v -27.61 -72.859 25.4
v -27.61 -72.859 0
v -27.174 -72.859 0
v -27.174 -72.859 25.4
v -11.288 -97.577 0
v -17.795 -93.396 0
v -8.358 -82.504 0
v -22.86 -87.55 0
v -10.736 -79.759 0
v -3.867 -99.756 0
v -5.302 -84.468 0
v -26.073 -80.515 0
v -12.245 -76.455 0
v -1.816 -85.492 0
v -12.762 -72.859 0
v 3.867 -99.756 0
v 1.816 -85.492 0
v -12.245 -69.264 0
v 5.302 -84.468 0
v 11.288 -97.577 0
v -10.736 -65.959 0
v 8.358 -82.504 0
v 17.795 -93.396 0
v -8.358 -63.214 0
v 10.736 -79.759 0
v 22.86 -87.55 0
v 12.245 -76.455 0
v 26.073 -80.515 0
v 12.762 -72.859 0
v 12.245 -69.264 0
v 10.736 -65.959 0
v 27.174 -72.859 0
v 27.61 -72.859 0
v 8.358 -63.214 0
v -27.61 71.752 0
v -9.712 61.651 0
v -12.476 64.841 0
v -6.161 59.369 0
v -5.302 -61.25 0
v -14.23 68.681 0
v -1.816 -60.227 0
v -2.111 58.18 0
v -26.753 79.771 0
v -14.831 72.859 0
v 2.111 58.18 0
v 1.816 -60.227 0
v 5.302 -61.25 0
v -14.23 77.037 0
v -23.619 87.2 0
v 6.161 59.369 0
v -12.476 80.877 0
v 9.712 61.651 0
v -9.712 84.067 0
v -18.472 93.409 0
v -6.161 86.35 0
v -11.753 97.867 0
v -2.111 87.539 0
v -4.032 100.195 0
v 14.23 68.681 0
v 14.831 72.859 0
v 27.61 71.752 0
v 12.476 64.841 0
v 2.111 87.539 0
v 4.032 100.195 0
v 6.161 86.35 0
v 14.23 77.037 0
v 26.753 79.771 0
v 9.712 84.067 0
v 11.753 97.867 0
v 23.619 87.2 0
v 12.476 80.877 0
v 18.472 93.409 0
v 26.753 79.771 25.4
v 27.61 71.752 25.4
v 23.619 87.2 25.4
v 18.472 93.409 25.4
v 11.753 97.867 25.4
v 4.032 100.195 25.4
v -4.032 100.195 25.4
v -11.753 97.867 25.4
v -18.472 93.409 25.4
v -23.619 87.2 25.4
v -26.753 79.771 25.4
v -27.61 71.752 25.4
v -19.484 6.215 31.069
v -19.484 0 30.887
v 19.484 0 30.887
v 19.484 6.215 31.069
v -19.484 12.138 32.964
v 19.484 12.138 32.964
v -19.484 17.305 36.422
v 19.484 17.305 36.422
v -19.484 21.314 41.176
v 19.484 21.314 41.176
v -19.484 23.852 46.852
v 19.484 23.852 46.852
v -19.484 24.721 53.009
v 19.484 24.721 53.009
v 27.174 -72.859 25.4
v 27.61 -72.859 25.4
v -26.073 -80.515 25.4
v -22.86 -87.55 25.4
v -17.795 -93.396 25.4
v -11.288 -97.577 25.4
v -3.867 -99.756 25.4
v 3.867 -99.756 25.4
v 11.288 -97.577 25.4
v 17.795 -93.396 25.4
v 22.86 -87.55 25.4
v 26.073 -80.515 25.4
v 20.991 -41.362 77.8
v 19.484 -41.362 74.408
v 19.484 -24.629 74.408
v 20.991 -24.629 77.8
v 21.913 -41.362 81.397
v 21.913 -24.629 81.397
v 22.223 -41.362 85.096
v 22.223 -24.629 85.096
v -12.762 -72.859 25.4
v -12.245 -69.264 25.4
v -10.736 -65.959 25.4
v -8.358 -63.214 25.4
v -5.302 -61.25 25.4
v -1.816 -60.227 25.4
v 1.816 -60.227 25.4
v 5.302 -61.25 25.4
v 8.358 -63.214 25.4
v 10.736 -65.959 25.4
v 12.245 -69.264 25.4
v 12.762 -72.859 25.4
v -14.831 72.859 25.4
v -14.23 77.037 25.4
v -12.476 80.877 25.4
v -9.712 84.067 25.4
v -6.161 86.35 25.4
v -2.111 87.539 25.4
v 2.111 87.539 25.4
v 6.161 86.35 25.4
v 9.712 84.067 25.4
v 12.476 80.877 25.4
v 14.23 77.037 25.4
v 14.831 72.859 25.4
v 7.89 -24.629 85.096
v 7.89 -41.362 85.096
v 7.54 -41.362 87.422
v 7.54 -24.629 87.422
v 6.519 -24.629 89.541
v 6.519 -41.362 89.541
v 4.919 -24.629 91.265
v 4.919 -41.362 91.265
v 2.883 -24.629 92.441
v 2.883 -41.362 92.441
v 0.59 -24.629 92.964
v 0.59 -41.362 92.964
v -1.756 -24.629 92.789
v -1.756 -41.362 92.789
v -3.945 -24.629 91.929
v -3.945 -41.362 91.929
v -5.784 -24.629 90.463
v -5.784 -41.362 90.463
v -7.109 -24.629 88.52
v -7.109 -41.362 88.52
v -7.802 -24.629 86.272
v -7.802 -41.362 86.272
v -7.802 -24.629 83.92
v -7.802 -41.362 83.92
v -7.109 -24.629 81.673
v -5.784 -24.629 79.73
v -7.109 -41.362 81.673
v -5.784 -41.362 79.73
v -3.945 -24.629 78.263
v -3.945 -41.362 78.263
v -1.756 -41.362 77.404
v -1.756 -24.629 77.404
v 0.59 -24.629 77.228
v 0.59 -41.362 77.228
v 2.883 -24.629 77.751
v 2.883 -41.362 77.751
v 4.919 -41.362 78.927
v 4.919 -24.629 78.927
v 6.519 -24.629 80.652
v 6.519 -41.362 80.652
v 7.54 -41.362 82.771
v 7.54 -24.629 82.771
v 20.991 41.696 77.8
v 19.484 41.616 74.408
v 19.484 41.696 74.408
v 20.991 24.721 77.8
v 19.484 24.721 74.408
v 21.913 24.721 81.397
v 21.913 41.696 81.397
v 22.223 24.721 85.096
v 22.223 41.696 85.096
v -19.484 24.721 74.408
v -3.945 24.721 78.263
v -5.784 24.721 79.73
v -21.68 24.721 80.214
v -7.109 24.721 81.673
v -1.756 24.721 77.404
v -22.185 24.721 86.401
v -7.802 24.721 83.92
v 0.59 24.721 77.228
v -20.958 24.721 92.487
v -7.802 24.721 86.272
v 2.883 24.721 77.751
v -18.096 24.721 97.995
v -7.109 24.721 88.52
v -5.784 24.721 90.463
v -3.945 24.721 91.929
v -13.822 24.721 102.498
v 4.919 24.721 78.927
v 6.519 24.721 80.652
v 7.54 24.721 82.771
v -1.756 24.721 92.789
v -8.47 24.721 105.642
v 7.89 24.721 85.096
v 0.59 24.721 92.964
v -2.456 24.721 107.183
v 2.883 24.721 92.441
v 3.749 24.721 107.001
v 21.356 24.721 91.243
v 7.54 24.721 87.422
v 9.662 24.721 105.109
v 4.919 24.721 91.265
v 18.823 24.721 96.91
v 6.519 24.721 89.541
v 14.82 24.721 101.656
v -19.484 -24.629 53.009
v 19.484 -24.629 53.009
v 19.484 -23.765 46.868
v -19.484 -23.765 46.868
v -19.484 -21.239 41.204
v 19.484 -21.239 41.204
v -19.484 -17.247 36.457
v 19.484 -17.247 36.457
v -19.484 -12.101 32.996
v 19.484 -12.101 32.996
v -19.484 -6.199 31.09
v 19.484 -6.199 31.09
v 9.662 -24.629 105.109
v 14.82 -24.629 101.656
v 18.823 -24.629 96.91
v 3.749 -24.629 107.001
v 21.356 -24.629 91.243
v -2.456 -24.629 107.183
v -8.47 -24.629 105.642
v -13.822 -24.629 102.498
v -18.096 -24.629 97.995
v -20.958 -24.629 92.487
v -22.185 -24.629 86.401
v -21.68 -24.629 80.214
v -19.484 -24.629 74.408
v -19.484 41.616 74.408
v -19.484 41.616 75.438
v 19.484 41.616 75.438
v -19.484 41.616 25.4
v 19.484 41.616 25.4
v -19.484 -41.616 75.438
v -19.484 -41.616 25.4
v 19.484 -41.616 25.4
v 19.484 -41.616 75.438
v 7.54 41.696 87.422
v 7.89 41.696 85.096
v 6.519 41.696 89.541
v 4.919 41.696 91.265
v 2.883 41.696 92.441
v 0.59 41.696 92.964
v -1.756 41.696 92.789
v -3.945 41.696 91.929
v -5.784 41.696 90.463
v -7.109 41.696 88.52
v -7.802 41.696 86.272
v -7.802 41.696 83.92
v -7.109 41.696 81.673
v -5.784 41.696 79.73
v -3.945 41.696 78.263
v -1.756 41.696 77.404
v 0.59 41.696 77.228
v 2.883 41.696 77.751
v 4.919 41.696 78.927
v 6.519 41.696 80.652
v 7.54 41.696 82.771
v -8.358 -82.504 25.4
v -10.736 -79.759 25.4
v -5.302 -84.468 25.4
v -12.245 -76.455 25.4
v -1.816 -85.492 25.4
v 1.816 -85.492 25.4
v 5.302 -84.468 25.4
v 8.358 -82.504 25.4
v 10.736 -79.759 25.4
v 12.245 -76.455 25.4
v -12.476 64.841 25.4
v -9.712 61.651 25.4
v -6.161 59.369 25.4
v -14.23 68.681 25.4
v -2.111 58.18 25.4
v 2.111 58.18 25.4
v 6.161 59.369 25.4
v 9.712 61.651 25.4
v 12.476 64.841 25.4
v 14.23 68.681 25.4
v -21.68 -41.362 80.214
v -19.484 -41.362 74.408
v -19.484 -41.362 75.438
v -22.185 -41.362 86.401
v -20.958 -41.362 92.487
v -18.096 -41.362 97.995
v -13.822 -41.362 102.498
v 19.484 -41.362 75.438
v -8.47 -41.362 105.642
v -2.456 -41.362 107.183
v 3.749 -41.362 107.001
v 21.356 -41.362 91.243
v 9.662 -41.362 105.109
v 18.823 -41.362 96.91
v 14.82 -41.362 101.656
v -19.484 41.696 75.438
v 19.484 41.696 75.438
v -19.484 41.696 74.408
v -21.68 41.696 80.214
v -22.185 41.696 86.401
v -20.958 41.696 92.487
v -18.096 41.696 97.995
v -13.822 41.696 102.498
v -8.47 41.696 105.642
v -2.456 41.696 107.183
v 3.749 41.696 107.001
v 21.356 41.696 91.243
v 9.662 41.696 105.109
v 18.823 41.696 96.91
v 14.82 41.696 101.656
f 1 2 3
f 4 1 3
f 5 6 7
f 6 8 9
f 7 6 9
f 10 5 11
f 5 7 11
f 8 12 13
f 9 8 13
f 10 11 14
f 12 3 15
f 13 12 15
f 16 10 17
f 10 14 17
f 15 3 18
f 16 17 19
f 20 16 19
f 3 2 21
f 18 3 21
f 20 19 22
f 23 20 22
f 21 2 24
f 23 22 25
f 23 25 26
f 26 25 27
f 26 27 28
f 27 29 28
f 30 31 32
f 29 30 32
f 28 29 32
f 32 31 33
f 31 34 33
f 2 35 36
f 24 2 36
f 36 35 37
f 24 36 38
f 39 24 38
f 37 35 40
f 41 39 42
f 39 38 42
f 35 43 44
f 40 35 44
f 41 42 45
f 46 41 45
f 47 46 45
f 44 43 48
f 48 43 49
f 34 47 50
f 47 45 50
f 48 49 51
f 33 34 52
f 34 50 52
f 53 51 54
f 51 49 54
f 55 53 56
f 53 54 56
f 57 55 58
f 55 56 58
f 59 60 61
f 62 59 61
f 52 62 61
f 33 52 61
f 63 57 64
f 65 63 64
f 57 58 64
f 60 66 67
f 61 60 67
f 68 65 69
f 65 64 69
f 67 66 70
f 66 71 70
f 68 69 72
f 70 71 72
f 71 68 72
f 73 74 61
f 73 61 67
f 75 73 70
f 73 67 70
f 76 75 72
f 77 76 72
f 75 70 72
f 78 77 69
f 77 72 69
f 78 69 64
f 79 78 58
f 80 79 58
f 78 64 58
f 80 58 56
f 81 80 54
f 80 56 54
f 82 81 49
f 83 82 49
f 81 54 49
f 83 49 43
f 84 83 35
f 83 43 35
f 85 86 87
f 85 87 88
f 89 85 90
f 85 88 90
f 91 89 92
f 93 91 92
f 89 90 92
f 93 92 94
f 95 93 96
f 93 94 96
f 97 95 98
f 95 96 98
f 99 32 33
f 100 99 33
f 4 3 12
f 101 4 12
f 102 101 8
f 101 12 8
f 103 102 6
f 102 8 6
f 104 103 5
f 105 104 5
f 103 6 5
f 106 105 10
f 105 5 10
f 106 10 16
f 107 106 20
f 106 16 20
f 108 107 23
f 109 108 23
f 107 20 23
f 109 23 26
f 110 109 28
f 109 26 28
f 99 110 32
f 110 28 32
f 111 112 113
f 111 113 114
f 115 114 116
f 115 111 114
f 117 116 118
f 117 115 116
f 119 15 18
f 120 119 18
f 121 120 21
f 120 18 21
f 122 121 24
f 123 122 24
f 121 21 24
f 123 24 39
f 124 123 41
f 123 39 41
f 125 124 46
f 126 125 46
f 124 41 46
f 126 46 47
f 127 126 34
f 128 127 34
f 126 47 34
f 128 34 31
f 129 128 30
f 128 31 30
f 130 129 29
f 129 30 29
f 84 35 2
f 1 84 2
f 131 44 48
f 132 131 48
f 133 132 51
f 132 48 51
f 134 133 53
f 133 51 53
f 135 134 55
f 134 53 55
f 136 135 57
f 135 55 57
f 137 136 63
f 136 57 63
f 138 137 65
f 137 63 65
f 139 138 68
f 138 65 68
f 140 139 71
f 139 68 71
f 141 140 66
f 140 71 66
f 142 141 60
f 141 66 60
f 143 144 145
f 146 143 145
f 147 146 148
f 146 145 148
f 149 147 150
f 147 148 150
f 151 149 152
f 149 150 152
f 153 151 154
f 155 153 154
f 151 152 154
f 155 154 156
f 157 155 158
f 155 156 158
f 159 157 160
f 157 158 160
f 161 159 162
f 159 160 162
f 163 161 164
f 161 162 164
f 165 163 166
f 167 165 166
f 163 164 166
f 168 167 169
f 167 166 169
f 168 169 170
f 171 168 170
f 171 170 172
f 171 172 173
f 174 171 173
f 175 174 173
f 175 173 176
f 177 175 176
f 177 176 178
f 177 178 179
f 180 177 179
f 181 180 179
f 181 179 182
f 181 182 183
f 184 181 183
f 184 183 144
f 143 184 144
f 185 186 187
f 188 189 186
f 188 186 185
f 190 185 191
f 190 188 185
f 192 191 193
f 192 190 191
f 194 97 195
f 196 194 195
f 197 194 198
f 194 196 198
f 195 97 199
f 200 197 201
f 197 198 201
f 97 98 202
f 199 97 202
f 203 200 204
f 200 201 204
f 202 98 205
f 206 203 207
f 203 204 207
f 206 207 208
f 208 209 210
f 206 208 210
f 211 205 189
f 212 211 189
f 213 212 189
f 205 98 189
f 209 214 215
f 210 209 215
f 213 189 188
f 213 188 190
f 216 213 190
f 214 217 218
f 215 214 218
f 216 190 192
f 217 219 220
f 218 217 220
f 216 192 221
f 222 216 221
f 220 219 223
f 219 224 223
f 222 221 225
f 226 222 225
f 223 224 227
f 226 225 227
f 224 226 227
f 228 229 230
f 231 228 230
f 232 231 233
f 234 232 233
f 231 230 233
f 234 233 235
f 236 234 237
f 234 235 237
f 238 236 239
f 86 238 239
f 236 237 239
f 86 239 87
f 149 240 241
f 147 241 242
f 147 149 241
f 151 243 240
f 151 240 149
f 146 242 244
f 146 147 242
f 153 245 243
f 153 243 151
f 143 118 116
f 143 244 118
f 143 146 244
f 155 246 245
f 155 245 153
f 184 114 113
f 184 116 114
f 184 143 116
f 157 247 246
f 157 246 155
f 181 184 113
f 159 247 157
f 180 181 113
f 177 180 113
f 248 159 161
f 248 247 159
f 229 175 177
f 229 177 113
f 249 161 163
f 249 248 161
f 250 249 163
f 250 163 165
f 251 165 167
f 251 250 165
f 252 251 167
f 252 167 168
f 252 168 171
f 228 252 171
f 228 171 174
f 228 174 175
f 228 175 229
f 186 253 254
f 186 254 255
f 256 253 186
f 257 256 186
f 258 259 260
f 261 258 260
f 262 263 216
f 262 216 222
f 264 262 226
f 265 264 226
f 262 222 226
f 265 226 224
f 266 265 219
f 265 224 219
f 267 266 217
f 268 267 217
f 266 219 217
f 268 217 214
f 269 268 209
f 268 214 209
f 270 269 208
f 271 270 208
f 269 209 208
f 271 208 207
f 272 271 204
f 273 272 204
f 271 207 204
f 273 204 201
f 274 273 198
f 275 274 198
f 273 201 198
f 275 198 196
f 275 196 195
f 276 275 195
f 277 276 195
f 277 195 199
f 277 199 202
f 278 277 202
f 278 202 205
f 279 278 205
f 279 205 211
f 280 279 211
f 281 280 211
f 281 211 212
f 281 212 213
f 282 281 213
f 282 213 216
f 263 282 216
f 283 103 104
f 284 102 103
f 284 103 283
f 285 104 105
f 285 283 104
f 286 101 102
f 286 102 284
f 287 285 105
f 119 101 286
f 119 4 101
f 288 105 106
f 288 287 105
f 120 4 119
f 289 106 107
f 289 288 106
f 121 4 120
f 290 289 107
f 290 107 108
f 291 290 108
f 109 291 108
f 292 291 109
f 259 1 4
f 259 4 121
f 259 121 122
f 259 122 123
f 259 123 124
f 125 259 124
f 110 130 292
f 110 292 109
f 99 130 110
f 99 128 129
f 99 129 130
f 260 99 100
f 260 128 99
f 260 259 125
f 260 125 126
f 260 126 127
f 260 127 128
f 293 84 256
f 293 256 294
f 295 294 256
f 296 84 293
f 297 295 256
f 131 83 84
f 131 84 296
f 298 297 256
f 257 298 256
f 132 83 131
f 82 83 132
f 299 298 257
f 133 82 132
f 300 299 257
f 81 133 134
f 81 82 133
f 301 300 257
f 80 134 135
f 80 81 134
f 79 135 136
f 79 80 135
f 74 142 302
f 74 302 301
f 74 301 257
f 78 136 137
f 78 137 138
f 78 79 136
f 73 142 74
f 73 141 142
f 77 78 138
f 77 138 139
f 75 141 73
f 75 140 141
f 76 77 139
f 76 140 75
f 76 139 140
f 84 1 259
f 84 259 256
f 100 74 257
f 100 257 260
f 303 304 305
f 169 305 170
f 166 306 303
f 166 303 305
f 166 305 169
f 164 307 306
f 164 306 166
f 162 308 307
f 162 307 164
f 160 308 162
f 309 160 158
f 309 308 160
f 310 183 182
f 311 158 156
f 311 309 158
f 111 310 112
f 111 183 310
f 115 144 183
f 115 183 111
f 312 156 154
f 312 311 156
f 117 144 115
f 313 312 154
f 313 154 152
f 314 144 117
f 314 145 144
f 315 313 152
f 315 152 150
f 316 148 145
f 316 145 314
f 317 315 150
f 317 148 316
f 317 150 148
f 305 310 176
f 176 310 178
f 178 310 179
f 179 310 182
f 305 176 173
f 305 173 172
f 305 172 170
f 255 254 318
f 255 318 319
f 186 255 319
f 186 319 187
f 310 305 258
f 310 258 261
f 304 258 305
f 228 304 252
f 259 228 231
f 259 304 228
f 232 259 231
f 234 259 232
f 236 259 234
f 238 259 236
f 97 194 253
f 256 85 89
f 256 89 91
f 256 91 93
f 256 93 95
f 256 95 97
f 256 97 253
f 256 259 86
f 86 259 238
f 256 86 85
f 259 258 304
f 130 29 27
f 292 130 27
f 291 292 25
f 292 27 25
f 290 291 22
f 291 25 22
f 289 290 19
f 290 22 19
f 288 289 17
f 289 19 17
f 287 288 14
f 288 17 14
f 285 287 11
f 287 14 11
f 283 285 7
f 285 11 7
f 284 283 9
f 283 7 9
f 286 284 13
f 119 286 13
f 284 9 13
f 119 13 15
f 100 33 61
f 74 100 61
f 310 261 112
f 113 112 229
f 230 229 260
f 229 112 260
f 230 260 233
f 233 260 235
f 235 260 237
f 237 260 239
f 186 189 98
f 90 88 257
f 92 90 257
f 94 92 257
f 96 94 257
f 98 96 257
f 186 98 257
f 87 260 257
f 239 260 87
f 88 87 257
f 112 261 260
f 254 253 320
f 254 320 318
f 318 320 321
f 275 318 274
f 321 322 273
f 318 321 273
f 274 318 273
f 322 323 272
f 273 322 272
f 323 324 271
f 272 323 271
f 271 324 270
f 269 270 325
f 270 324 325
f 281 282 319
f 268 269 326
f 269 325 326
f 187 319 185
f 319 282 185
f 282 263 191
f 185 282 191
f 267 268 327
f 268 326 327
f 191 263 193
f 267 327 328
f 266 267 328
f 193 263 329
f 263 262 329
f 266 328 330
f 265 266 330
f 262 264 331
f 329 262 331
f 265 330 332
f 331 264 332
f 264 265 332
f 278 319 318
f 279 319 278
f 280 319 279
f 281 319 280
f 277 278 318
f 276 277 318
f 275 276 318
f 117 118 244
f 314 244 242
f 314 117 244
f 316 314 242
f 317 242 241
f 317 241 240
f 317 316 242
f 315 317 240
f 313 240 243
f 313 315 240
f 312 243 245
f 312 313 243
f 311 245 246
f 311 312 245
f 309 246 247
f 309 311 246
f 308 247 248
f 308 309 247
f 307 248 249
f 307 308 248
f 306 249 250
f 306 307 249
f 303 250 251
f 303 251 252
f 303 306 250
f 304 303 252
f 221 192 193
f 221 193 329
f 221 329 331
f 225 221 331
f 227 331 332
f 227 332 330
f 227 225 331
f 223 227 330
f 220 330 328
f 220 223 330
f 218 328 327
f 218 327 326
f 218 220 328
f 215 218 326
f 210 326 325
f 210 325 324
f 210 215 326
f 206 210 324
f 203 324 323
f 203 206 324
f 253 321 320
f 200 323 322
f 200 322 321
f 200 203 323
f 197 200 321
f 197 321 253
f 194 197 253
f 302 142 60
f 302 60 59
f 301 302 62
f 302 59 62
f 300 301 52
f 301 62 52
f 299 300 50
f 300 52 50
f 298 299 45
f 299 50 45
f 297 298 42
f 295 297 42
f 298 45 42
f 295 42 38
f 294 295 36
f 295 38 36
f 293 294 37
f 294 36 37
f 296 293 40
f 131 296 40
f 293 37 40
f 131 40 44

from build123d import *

# Parameters (mm, degrees)
F1_DEPTH      = 25.4
F2_W          = 38.9676727355
F2_H          = 83.2322090864
F3_DEPTH      = 50.038
F6_START      = -0.254
F5_R          = 7.8901435138
F6_DEPTH      = 83.058
F8_DEPTH      = 47.1165622497
F8_DEPTH_BACK = 8.1488895142


with BuildPart() as f1:
    # F0 (on Top) → F1 (new body)
    with BuildSketch(Plane.XY):
        with BuildLine():
            Line((-27.6095401496, 71.7521590341), (-27.6095401496, -72.8592127562))
            Line((-27.6095401496, -72.8592127562), (-27.1735749765, -72.8592127562))
            ThreePointArc((-27.1735749765, -72.8592127562), (0, -100.0327877326), (27.1735749765, -72.8592127562))
            Line((27.1735749765, -72.8592127562), (27.6095401496, -72.8592127562))
            Line((27.6095401496, -72.8592127562), (27.6095401496, 71.7521590341))
            ThreePointArc((27.6095401496, 71.7521590341), (0, 100.4909386381), (-27.6095401496, 71.7521590341))
        make_face()
        with BuildLine():
            ThreePointArc((-12.7623392826, -72.8592127562), (0, -60.0968734736), (12.7623392826, -72.8592127562))
            ThreePointArc((12.7623392826, -72.8592127562), (0, -85.6215520387), (-12.7623392826, -72.8592127562))
        make_face(mode=Mode.SUBTRACT)
        with BuildLine():
            ThreePointArc((14.8305593579, 72.8592127562), (0, 58.0286533983), (-14.8305593579, 72.8592127562))
            ThreePointArc((-14.8305593579, 72.8592127562), (0, 87.689772114), (14.8305593579, 72.8592127562))
        make_face(mode=Mode.SUBTRACT)
    extrude(amount=F1_DEPTH)

    # F2 (on face) → F3 (join)
    with BuildSketch(Plane.XY.offset(25.4)):
        Rectangle(F2_W, F2_H)
    extrude(amount=F3_DEPTH)

    # F5 (on face) → F6 (join)
    with BuildSketch(Plane.XZ.offset(41.6161045432).offset(F6_START)):
        with BuildLine():
            ThreePointArc((19.4838363677, 74.4076669397), (21.5273694016, 79.5792249141), (22.2230663556, 85.0962027907))
            ThreePointArc((22.2230663556, 85.0962027907), (-5.5169778767, 106.6235721923), (-19.4838363677, 74.4076669397))
            Line((-19.4838363677, 74.4076669397), (-19.4838363677, 75.438))
            Line((-19.4838363677, 75.438), (19.4838363677, 75.438))
            Line((19.4838363677, 75.438), (19.4838363677, 74.4076669397))
        make_face()
        with Locations((0, 85.0962027907)):
            Circle(F5_R, mode=Mode.SUBTRACT)
    extrude(amount=-F6_DEPTH)

    # F7 (on face) → F8 (cut, two sides)
    with BuildSketch(Plane.YZ.offset(19.4838363677)) as f8_sk:
        with BuildLine():
            Line((24.7208084911, 53.0094616115), (24.7208084911, 74.4076669397))
            Line((24.7208084911, 74.4076669397), (-24.6291831136, 74.4076669397))
            Line((-24.6291831136, 74.4076669397), (-24.6291831136, 53.0094616115))
            ThreePointArc((-24.6291831136, 53.0094616115), (-17.2473636439, 36.4565333824), (0, 30.8870505542))
            ThreePointArc((0, 30.8870505542), (17.3054188168, 36.4224226696), (24.7208084911, 53.0094616115))
        make_face()
        Polygon((24.7208084911, 74.4076669397), (24.7208084911, 108.5037675067), (-24.6291831136, 108.1680555029), (-24.6291831136, 74.4076669397), align=None)
    extrude(amount=-F8_DEPTH, mode=Mode.SUBTRACT)
    extrude(f8_sk.sketch, amount=F8_DEPTH_BACK, mode=Mode.SUBTRACT)


solid = f1.part
